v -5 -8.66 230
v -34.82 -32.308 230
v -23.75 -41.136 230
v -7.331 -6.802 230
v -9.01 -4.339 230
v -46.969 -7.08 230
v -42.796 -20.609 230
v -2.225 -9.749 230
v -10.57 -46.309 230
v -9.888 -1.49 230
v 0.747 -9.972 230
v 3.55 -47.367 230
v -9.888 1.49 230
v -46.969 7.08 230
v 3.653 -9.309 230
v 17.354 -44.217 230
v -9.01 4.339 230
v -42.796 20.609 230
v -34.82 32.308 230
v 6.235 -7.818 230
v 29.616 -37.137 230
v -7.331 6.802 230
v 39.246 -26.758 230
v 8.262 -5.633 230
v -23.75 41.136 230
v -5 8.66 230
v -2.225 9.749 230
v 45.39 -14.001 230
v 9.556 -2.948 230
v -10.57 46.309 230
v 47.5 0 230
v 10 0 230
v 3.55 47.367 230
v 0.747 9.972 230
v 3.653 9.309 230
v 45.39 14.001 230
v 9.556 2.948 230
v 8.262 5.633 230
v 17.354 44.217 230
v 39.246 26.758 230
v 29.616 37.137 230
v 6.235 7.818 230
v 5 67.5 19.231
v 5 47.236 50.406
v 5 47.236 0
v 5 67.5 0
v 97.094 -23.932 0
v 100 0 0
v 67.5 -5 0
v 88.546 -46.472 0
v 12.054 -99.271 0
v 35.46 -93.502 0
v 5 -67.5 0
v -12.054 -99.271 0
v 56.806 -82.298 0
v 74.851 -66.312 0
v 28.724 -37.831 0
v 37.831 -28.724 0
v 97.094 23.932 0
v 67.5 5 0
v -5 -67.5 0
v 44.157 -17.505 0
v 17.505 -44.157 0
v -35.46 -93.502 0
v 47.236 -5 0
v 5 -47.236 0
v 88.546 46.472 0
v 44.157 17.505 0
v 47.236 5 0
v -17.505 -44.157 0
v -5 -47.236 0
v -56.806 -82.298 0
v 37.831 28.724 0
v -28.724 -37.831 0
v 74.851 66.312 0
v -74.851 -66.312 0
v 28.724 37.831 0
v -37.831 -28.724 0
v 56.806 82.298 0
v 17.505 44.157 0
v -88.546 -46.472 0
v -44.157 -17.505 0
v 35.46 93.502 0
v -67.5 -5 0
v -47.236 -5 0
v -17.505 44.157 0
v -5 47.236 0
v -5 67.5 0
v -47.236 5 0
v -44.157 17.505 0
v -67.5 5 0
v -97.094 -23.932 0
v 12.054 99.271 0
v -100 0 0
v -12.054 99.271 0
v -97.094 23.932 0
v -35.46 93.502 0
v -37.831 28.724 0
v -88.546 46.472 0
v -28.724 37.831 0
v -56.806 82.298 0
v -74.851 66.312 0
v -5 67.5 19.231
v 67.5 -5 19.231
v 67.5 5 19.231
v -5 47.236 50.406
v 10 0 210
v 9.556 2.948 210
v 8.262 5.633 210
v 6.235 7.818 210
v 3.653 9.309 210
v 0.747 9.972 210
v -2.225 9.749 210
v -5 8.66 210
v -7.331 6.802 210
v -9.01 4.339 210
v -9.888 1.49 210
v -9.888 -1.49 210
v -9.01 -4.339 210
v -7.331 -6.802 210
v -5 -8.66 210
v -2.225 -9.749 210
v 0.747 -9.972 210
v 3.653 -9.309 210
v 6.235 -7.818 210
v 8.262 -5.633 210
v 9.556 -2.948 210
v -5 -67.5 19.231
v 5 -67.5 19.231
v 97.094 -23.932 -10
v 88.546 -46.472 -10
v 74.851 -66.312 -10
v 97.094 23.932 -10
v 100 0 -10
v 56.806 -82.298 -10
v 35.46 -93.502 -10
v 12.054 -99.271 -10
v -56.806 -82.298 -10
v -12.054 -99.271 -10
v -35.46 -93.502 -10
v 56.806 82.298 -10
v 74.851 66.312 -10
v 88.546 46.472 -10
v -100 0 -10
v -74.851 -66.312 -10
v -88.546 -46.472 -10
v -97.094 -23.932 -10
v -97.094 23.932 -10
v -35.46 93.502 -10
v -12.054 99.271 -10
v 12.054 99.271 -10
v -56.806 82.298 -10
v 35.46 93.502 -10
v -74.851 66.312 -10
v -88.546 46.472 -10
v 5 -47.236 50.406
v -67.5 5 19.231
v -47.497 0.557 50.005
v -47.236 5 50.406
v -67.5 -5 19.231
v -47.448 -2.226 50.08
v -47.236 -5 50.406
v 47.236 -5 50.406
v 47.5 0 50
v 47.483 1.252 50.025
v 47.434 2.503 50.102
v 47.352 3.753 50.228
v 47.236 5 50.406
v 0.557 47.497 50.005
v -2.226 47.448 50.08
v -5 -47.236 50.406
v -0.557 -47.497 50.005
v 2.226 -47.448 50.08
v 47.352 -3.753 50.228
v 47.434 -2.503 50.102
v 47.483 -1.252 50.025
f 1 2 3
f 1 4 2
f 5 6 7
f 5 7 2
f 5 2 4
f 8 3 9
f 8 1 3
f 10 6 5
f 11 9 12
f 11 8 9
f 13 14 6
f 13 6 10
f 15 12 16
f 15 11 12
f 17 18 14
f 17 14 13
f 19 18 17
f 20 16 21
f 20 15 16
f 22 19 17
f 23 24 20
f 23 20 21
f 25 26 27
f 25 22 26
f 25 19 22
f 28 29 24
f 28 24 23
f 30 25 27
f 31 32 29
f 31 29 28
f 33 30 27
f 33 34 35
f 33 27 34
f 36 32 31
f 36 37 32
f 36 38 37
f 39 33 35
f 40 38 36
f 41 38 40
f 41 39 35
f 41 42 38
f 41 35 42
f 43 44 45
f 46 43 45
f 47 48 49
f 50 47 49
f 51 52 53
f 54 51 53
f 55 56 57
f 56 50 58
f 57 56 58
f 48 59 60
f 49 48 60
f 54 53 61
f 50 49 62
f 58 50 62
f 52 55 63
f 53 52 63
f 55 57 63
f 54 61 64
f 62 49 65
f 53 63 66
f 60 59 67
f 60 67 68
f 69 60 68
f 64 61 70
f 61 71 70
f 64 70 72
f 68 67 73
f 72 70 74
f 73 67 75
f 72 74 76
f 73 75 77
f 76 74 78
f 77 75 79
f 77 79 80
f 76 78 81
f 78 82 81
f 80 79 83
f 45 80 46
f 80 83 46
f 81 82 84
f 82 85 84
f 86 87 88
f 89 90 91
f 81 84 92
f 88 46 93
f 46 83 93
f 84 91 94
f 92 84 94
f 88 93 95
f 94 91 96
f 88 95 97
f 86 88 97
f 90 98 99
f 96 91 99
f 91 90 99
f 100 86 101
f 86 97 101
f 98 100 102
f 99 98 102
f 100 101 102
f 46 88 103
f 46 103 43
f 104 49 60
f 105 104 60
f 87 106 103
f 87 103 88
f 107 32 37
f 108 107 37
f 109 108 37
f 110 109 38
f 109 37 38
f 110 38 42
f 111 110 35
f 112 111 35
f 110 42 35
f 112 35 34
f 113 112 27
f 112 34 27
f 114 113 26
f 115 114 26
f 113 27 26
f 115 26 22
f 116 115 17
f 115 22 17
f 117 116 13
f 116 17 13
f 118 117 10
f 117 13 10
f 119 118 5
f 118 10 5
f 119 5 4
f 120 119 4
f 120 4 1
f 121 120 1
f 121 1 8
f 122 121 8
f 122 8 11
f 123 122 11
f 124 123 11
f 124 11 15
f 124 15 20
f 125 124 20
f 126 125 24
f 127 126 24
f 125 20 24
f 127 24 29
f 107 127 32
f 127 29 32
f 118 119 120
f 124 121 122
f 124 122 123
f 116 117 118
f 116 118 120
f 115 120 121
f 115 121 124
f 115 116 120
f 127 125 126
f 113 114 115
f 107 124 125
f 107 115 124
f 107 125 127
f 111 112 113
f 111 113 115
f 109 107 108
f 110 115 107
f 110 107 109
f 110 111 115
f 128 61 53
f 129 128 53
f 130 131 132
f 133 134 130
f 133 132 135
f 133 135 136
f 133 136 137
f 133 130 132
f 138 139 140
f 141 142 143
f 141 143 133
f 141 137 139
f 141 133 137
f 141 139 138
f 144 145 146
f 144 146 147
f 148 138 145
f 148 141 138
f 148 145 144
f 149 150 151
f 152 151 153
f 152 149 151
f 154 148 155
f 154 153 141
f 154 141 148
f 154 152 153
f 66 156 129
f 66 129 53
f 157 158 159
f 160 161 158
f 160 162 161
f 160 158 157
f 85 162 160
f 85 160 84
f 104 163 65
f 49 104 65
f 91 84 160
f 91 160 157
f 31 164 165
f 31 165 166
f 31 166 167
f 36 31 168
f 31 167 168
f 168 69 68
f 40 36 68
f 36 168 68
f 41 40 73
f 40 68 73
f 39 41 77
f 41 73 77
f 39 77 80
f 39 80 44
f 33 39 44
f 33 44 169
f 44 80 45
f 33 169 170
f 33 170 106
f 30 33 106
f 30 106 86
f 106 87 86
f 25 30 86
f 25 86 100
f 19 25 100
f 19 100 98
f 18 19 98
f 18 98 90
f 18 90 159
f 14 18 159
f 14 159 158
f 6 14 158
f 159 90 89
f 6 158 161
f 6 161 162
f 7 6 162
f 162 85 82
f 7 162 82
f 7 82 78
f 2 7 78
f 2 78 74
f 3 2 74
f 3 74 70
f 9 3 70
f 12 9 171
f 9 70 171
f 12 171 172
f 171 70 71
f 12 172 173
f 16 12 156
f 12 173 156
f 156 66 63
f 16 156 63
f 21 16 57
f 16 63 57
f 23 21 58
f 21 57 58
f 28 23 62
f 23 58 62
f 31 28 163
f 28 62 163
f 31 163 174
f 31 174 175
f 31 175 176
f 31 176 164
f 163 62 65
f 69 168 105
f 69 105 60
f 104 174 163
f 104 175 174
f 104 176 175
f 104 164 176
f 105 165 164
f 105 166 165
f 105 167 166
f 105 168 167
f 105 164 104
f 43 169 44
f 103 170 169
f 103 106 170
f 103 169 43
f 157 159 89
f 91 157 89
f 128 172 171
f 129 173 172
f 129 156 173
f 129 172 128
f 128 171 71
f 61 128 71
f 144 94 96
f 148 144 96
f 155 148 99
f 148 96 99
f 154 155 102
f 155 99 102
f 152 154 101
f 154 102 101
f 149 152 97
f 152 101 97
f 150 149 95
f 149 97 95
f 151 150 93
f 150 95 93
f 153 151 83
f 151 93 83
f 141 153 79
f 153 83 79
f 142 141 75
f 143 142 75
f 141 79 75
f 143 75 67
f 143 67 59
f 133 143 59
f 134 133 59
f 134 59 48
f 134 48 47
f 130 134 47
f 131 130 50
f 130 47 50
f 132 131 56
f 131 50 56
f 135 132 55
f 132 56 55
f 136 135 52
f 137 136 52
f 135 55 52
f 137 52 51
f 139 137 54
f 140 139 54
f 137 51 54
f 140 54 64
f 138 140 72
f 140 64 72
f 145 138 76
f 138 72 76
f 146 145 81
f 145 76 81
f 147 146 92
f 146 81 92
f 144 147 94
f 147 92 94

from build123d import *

# Parameters (mm, degrees)
SKETCH1_R           = 47.5
BOSS_EXTRUDE1_DEPTH = 230
SKETCH2_R           = 10
CUT_EXTRUDE1_DEPTH  = 20
SKETCH3_R           = 100
BOSS_EXTRUDE2_DEPTH = 10
RIB1_REACH          = 272
SKETCH4_WALL_W      = 601.63430221
SKETCH4_WALL_H      = 10
CIRPATTERN1_COUNT   = 4
SKETCH7_OUTSIDE_W   = 276.188
SKETCH7_OUTSIDE_H   = 276.188
SKETCH7_OUTSIDE_W_2 = 135
SKETCH7_OUTSIDE_H_2 = 135
CUT_EXTRUDE2_DEPTH  = 73


with BuildPart() as part:
    # Sketch1 → Boss-Extrude1 (new body)
    with BuildSketch(Plane.XY):
        Circle(SKETCH1_R)
    extrude(amount=BOSS_EXTRUDE1_DEPTH)

    # Sketch2 → Cut-Extrude1 (cut)
    with BuildSketch(Plane.XY.offset(230)):
        Circle(SKETCH2_R)
    extrude(amount=-CUT_EXTRUDE1_DEPTH, mode=Mode.SUBTRACT)

    # Sketch3 → Boss-Extrude2 (add)
    with BuildSketch(Plane(origin=(0, 0, 0), x_dir=(-1, 0, 0), z_dir=(0, 0, -1))):
        Circle(SKETCH3_R)
    extrude(amount=BOSS_EXTRUDE2_DEPTH)

    # Sketch4 wall → Rib1 (add, up to next)
    with BuildSketch(Plane(origin=(-63.75, 0, 25), x_dir=(-0.544988350595, 0, -0.838443616301), z_dir=(-0.838443616301, 0, 0.544988350595)), mode=Mode.PRIVATE) as rib1_sk1:
        Rectangle(SKETCH4_WALL_W, SKETCH4_WALL_H)
    rib1_tool1 = extrude(rib1_sk1.sketch, amount=-RIB1_REACH, mode=Mode.PRIVATE) - part.part
    rib1 = rib1_tool1.solids().sort_by_distance((-63.75, 0, 25))[0]
    add(rib1)

    # CirPattern1: Rib1 ×4 about axis
    cirpattern1_axis = Axis((0, 0, 0), (0, 0, 1))
    for i in range(1, CIRPATTERN1_COUNT):
        add(rib1.rotate(cirpattern1_axis, i * 360 / CIRPATTERN1_COUNT))

    # Sketch7 outside → Cut-Extrude2 (cut)
    with BuildSketch(Plane.XY):
        Rectangle(SKETCH7_OUTSIDE_W, SKETCH7_OUTSIDE_H)
        Rectangle(SKETCH7_OUTSIDE_W_2, SKETCH7_OUTSIDE_H_2, mode=Mode.SUBTRACT)
    extrude(amount=CUT_EXTRUDE2_DEPTH, mode=Mode.SUBTRACT)


solid = part.part
